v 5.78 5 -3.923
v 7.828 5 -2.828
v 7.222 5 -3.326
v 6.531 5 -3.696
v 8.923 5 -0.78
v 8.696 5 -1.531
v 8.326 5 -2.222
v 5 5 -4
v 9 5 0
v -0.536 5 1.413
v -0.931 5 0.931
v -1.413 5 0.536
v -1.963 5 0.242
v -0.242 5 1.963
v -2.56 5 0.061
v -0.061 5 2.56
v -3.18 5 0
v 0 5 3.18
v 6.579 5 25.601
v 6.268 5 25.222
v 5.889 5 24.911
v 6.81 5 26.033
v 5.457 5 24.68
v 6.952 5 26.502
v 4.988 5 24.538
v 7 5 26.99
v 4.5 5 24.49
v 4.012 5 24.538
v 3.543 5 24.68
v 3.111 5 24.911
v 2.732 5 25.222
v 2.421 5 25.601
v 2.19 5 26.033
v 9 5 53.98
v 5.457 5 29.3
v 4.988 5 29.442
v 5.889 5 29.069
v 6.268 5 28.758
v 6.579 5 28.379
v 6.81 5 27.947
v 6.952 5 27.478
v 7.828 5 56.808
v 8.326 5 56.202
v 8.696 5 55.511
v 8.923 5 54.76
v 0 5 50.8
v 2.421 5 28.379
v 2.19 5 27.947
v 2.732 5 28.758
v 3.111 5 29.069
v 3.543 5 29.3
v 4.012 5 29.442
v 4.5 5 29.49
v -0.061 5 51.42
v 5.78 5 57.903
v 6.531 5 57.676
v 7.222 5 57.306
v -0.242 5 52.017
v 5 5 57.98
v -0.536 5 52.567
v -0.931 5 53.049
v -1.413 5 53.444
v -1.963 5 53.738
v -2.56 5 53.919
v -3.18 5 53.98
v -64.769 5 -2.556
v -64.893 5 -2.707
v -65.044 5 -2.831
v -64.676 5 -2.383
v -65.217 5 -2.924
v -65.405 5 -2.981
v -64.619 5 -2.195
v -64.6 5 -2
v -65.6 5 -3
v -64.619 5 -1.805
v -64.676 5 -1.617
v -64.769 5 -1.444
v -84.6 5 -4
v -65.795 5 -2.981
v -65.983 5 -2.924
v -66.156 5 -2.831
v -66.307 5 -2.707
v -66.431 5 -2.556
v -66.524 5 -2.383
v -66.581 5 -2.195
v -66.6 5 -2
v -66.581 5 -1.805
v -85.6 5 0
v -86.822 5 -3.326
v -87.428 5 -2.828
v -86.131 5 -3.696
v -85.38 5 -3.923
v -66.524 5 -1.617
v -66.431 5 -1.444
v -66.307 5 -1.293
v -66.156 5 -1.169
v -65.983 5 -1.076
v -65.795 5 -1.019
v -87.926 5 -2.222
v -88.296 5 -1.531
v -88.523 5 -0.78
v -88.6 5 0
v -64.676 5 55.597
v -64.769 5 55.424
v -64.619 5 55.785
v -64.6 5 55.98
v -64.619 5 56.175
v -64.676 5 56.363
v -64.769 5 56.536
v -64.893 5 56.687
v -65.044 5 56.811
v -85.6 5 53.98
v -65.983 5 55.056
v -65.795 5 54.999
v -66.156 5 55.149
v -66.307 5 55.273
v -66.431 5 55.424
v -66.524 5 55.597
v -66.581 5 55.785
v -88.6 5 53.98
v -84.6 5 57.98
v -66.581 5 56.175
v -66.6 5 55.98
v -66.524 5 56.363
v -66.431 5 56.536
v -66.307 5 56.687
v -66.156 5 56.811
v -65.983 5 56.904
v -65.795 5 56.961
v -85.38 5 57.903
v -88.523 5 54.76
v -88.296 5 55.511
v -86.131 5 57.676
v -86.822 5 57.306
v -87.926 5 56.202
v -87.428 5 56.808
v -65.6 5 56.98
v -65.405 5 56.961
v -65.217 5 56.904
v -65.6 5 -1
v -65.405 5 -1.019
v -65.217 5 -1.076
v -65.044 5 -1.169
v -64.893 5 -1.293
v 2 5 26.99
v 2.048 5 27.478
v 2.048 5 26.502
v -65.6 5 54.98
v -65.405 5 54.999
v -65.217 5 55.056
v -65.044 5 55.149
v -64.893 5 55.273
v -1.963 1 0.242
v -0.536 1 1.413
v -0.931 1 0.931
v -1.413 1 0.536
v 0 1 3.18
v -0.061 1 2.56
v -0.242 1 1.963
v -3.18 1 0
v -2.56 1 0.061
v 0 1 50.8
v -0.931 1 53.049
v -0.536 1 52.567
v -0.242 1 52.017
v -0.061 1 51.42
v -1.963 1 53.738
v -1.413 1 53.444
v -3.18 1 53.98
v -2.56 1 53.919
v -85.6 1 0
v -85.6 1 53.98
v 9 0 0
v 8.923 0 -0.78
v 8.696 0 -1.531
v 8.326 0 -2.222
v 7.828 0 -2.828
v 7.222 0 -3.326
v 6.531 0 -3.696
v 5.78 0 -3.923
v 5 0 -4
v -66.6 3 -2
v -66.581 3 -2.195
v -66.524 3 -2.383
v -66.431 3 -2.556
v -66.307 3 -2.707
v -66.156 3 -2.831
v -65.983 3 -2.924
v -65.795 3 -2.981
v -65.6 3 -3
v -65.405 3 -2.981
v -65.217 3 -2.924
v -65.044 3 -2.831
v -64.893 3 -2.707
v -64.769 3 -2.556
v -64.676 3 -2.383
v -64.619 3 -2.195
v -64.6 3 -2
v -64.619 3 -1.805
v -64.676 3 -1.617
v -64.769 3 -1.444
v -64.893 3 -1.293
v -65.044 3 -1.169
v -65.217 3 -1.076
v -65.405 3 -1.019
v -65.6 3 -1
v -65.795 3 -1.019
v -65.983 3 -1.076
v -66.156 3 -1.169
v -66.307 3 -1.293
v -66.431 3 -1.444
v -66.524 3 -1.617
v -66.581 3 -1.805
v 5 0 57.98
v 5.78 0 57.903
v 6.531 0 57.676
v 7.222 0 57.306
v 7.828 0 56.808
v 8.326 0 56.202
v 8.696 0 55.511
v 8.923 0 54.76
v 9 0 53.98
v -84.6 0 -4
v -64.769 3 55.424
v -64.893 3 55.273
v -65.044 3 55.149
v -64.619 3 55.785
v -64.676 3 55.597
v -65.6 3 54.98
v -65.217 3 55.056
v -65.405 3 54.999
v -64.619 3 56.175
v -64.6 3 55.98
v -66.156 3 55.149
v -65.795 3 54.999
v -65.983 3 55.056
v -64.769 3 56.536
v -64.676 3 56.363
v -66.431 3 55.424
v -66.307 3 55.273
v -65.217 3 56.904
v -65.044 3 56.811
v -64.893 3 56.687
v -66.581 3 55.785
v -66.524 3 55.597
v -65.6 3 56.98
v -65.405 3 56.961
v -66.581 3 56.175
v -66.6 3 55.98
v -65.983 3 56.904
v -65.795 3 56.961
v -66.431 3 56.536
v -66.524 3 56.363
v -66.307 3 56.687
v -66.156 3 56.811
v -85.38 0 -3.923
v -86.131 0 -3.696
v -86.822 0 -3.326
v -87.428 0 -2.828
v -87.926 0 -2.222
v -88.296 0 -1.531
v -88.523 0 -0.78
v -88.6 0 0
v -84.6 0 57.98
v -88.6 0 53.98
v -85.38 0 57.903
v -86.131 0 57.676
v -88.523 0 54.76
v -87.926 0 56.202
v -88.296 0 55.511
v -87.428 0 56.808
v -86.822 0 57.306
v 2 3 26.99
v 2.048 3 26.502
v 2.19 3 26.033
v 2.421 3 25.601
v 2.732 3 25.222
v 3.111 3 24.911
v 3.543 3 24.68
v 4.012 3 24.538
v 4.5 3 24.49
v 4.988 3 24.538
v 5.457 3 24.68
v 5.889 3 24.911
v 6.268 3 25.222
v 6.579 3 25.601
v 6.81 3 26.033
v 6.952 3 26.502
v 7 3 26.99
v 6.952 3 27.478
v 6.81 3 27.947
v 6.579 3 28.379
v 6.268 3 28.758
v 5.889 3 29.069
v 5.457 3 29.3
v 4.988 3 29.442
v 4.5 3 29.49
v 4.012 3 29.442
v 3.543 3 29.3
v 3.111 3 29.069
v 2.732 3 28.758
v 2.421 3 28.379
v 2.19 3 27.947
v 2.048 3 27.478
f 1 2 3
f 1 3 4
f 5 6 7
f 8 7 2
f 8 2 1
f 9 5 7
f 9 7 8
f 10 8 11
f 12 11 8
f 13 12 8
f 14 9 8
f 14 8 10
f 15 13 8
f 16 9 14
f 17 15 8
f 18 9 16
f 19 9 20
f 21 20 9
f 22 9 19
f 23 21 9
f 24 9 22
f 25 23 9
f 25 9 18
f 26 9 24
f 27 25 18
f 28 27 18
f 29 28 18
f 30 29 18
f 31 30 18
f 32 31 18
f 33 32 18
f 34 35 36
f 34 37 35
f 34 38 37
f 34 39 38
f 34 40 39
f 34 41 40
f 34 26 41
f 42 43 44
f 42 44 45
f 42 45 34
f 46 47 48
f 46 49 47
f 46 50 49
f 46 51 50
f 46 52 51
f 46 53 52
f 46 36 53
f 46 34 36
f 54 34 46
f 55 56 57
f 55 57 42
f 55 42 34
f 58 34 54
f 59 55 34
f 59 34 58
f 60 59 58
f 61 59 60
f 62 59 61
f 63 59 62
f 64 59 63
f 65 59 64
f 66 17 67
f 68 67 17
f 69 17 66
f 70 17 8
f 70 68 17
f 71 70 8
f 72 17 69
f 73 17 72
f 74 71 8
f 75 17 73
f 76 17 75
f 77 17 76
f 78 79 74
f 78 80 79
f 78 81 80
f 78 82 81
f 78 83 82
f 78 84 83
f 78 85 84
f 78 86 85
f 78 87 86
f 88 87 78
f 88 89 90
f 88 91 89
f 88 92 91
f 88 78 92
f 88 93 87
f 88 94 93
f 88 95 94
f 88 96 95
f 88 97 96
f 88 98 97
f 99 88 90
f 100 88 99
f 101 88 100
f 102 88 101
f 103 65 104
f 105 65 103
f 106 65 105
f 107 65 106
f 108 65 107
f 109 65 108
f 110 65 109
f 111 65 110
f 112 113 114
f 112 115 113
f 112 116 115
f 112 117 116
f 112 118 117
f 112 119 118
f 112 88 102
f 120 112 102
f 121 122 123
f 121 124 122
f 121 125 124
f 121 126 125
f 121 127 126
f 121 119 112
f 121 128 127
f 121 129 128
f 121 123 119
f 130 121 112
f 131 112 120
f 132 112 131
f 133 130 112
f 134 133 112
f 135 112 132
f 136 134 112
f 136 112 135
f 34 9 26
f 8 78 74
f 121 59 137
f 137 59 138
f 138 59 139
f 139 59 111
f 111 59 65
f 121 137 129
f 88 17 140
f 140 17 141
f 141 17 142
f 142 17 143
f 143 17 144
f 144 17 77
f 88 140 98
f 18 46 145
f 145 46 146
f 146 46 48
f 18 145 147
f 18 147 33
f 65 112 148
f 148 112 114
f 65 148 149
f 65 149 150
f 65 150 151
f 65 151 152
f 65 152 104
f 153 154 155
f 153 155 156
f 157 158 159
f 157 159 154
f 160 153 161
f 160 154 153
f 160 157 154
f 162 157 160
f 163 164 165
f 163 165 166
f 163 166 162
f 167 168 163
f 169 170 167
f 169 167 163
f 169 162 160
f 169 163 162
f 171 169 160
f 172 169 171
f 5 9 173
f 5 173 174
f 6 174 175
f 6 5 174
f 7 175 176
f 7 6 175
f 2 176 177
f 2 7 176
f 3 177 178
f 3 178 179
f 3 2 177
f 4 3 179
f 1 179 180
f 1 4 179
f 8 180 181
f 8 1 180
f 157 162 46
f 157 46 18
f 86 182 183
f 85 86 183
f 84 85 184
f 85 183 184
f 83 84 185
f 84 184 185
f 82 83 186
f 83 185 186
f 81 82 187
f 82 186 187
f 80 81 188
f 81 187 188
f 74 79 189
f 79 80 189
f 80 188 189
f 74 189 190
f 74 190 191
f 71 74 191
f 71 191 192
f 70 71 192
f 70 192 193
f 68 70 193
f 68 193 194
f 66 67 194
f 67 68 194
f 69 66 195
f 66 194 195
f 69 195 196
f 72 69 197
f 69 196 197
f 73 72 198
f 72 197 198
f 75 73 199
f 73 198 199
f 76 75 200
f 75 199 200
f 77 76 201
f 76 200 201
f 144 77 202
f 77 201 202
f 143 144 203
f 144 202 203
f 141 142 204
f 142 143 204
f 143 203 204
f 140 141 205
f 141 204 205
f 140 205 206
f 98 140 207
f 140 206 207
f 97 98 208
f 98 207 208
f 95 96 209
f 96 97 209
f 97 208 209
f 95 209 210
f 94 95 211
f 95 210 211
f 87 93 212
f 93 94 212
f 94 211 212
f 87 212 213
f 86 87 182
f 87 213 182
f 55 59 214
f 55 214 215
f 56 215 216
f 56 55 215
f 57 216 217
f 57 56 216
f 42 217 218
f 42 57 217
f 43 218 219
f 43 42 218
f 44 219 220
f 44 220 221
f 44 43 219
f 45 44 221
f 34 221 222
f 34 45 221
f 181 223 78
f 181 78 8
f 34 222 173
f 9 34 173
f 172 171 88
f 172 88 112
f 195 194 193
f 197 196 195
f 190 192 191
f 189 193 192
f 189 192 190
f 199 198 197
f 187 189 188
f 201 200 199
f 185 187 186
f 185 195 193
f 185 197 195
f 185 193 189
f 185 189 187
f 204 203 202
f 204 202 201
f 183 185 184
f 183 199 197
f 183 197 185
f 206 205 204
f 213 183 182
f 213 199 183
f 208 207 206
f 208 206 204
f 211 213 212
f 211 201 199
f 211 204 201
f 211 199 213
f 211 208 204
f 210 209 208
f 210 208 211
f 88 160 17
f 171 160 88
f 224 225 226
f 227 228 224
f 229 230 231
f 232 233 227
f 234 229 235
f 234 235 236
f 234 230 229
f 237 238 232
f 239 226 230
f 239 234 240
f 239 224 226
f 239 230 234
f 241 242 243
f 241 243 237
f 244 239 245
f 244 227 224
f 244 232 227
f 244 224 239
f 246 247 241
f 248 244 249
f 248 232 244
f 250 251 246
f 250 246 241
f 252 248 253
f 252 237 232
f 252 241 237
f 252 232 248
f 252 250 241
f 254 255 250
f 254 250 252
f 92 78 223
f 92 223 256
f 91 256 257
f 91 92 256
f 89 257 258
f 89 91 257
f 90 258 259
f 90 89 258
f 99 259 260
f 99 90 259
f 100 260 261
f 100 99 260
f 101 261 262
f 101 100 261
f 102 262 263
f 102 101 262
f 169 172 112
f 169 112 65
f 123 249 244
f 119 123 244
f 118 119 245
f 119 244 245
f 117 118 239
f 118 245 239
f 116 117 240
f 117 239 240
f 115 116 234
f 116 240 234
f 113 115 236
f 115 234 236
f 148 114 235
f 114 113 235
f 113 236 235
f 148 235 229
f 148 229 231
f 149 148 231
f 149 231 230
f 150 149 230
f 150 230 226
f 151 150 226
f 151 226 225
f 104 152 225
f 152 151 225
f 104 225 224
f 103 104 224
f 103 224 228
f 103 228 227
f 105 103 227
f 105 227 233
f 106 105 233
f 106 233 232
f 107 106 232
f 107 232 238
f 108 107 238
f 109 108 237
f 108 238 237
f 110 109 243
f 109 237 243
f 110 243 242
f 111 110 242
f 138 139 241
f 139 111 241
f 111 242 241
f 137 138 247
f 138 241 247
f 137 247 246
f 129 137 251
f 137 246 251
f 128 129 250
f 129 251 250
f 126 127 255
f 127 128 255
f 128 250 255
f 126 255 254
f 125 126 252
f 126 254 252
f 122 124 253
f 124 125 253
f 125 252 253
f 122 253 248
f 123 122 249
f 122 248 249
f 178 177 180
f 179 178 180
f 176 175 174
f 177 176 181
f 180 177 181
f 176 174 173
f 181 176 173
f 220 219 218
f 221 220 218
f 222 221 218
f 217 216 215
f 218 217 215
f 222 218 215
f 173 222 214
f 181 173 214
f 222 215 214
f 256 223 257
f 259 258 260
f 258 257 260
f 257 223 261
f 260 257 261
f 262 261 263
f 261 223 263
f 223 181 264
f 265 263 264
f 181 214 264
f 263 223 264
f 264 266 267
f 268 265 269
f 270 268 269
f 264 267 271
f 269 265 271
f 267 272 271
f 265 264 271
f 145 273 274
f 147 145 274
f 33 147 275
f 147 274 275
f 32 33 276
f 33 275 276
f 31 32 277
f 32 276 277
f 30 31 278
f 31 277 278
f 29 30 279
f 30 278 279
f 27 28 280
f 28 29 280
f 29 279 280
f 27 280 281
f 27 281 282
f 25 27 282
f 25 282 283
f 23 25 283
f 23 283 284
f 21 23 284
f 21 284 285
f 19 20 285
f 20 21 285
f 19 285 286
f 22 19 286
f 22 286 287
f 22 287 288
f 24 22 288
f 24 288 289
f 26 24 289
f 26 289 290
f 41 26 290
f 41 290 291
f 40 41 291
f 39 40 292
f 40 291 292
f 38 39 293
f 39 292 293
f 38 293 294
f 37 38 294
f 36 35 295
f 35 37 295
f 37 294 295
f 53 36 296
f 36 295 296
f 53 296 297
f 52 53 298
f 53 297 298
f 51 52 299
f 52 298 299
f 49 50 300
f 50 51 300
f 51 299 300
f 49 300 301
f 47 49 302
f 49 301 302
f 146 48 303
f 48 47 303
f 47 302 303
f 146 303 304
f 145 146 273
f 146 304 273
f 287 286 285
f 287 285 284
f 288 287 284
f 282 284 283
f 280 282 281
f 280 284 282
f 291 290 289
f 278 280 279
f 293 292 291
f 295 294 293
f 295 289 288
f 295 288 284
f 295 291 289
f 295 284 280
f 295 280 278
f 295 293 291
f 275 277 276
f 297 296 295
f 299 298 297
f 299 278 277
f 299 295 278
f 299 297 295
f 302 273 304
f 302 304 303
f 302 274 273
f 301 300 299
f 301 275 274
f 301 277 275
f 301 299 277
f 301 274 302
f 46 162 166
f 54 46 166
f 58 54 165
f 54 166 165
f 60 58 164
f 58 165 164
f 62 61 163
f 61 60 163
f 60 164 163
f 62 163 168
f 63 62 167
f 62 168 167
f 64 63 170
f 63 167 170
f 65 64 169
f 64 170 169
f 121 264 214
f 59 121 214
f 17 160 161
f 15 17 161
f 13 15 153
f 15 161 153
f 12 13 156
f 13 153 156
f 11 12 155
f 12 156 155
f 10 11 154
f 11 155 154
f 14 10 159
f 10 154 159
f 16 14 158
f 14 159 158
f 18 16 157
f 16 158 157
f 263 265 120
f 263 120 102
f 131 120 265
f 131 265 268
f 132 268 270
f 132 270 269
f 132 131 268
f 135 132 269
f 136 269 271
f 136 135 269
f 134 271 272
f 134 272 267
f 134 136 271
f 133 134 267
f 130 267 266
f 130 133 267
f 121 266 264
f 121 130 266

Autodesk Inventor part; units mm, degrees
ref_plane "YZ Plane" through (0, 0, 0) normal (1, 0, 0) x (0, 1, 0)
ref_plane "XZ Plane" through (0, 0, 0) normal (0, 1, 0) x (-1, 0, 0)
ref_plane "XY Plane" through (0, 0, 0) normal (0, 0, 1) x (1, 0, 0)
sketch "Sketch1" plane through (0, 0, 0) normal (0, 1, 0) x (-1, 0, 0)
  line L0 (0, 0) -> (85.6, 0)
  line L1 (85.6, 0) -> (85.6, 53.98)
  line L2 (85.6, 53.98) -> (0, 53.98)
  line L3 (0, 53.98) -> (0, 0)
  line L4 (0, 53.98) -> (0, 50.8)
  line L5 (0, 50.8) -> (3.18, 50.8)
  circle A0 centre (3.18, 50.8) radius 3.18
  line L6 (85.6, 53.98) -> (85.6, 57.98)
  line L7 (85.6, 57.98) -> (0, 57.98)
  line L8 (0, 57.98) -> (-9, 57.98)
  line L9 (-9, 57.98) -> (-9, 0)
  line L10 (-9, 0) -> (0, 0)
  line L11 (0, 26.99) -> (-4.5, 26.99)
  circle A1 centre (-4.5, 26.99) radius 2.5
  line L12 (85.6, 55.98) -> (65.6, 55.98)
  circle A2 centre (65.6, 55.98) radius 1
  line L13 (0, 26.99) -> (85.6, 26.99)
  line L14 (85.6, -4) -> (0, -4)
  line L15 (0, -4) -> (-9, -4)
  circle A3 centre (65.6, -2) radius 1
  line L16 (85.6, -4) -> (85.6, 0)
  line L17 (-9, -4) -> (-9, 0)
  line L18 (85.6, 57.98) -> (88.6, 57.98)
  line L19 (88.6, 57.98) -> (88.6, -4)
  line L20 (88.6, -4) -> (85.6, -4)
  line L21 (85.6, -4) -> (85.6, 57.98)
  line L22 (85.6, 53.98) -> (88.6, 53.98)
  line L23 (85.6, 0) -> (88.6, 0)
  circle A4 centre (3.18, 3.18) radius 3.18
  point P0 (3.18, 0)
  point P1 (0, 3.18)
  point P2 (3.18, 53.98)
  dimension "d0" = 85.6
  dimension "d1" = 53.98
  dimension "d2" = 3.18
  dimension "d3" = 3.18
  dimension "d4" = 4
  dimension "d5" = 9
  dimension "d6" = 5
  dimension "d7" = 20
  dimension "d8" = 2
  dimension "d9" = 3
extrude "Extrusion1" add sketch "Sketch1" along normal blind 5 contours L3 A4 L0 | L10 L9 L8 L7 L6 L2 L3 | L0 L16 L14 L15 L17 L10 | L3 L2 A0 | L6 L18 L19 L22
extrude "Extrusion2" add sketch "Sketch1" along normal blind 1 contours A4 L3 L13 L1 L0 | A4 | L3 A0 L2 L1 L13 | A0
extrude "Extrusion3" add sketch "Sketch1" along normal blind 5 contours L23 L19 L20 L16
extrude "Extrusion4" add sketch "Sketch1" along normal blind 5 contours L1 L22 L19 L23
fillet "Fillet2" radius 4 4 edges at (-88.6, 2.5, 57.98) (-88.6, 2.5, -4) (9, 2.5, -4) (9, 2.5, 57.98)
extrude "Extrusion5" add sketch "Sketch1" along normal blind 3 contours A1 | A2 | A3
properties part number "magnet card bottom"
